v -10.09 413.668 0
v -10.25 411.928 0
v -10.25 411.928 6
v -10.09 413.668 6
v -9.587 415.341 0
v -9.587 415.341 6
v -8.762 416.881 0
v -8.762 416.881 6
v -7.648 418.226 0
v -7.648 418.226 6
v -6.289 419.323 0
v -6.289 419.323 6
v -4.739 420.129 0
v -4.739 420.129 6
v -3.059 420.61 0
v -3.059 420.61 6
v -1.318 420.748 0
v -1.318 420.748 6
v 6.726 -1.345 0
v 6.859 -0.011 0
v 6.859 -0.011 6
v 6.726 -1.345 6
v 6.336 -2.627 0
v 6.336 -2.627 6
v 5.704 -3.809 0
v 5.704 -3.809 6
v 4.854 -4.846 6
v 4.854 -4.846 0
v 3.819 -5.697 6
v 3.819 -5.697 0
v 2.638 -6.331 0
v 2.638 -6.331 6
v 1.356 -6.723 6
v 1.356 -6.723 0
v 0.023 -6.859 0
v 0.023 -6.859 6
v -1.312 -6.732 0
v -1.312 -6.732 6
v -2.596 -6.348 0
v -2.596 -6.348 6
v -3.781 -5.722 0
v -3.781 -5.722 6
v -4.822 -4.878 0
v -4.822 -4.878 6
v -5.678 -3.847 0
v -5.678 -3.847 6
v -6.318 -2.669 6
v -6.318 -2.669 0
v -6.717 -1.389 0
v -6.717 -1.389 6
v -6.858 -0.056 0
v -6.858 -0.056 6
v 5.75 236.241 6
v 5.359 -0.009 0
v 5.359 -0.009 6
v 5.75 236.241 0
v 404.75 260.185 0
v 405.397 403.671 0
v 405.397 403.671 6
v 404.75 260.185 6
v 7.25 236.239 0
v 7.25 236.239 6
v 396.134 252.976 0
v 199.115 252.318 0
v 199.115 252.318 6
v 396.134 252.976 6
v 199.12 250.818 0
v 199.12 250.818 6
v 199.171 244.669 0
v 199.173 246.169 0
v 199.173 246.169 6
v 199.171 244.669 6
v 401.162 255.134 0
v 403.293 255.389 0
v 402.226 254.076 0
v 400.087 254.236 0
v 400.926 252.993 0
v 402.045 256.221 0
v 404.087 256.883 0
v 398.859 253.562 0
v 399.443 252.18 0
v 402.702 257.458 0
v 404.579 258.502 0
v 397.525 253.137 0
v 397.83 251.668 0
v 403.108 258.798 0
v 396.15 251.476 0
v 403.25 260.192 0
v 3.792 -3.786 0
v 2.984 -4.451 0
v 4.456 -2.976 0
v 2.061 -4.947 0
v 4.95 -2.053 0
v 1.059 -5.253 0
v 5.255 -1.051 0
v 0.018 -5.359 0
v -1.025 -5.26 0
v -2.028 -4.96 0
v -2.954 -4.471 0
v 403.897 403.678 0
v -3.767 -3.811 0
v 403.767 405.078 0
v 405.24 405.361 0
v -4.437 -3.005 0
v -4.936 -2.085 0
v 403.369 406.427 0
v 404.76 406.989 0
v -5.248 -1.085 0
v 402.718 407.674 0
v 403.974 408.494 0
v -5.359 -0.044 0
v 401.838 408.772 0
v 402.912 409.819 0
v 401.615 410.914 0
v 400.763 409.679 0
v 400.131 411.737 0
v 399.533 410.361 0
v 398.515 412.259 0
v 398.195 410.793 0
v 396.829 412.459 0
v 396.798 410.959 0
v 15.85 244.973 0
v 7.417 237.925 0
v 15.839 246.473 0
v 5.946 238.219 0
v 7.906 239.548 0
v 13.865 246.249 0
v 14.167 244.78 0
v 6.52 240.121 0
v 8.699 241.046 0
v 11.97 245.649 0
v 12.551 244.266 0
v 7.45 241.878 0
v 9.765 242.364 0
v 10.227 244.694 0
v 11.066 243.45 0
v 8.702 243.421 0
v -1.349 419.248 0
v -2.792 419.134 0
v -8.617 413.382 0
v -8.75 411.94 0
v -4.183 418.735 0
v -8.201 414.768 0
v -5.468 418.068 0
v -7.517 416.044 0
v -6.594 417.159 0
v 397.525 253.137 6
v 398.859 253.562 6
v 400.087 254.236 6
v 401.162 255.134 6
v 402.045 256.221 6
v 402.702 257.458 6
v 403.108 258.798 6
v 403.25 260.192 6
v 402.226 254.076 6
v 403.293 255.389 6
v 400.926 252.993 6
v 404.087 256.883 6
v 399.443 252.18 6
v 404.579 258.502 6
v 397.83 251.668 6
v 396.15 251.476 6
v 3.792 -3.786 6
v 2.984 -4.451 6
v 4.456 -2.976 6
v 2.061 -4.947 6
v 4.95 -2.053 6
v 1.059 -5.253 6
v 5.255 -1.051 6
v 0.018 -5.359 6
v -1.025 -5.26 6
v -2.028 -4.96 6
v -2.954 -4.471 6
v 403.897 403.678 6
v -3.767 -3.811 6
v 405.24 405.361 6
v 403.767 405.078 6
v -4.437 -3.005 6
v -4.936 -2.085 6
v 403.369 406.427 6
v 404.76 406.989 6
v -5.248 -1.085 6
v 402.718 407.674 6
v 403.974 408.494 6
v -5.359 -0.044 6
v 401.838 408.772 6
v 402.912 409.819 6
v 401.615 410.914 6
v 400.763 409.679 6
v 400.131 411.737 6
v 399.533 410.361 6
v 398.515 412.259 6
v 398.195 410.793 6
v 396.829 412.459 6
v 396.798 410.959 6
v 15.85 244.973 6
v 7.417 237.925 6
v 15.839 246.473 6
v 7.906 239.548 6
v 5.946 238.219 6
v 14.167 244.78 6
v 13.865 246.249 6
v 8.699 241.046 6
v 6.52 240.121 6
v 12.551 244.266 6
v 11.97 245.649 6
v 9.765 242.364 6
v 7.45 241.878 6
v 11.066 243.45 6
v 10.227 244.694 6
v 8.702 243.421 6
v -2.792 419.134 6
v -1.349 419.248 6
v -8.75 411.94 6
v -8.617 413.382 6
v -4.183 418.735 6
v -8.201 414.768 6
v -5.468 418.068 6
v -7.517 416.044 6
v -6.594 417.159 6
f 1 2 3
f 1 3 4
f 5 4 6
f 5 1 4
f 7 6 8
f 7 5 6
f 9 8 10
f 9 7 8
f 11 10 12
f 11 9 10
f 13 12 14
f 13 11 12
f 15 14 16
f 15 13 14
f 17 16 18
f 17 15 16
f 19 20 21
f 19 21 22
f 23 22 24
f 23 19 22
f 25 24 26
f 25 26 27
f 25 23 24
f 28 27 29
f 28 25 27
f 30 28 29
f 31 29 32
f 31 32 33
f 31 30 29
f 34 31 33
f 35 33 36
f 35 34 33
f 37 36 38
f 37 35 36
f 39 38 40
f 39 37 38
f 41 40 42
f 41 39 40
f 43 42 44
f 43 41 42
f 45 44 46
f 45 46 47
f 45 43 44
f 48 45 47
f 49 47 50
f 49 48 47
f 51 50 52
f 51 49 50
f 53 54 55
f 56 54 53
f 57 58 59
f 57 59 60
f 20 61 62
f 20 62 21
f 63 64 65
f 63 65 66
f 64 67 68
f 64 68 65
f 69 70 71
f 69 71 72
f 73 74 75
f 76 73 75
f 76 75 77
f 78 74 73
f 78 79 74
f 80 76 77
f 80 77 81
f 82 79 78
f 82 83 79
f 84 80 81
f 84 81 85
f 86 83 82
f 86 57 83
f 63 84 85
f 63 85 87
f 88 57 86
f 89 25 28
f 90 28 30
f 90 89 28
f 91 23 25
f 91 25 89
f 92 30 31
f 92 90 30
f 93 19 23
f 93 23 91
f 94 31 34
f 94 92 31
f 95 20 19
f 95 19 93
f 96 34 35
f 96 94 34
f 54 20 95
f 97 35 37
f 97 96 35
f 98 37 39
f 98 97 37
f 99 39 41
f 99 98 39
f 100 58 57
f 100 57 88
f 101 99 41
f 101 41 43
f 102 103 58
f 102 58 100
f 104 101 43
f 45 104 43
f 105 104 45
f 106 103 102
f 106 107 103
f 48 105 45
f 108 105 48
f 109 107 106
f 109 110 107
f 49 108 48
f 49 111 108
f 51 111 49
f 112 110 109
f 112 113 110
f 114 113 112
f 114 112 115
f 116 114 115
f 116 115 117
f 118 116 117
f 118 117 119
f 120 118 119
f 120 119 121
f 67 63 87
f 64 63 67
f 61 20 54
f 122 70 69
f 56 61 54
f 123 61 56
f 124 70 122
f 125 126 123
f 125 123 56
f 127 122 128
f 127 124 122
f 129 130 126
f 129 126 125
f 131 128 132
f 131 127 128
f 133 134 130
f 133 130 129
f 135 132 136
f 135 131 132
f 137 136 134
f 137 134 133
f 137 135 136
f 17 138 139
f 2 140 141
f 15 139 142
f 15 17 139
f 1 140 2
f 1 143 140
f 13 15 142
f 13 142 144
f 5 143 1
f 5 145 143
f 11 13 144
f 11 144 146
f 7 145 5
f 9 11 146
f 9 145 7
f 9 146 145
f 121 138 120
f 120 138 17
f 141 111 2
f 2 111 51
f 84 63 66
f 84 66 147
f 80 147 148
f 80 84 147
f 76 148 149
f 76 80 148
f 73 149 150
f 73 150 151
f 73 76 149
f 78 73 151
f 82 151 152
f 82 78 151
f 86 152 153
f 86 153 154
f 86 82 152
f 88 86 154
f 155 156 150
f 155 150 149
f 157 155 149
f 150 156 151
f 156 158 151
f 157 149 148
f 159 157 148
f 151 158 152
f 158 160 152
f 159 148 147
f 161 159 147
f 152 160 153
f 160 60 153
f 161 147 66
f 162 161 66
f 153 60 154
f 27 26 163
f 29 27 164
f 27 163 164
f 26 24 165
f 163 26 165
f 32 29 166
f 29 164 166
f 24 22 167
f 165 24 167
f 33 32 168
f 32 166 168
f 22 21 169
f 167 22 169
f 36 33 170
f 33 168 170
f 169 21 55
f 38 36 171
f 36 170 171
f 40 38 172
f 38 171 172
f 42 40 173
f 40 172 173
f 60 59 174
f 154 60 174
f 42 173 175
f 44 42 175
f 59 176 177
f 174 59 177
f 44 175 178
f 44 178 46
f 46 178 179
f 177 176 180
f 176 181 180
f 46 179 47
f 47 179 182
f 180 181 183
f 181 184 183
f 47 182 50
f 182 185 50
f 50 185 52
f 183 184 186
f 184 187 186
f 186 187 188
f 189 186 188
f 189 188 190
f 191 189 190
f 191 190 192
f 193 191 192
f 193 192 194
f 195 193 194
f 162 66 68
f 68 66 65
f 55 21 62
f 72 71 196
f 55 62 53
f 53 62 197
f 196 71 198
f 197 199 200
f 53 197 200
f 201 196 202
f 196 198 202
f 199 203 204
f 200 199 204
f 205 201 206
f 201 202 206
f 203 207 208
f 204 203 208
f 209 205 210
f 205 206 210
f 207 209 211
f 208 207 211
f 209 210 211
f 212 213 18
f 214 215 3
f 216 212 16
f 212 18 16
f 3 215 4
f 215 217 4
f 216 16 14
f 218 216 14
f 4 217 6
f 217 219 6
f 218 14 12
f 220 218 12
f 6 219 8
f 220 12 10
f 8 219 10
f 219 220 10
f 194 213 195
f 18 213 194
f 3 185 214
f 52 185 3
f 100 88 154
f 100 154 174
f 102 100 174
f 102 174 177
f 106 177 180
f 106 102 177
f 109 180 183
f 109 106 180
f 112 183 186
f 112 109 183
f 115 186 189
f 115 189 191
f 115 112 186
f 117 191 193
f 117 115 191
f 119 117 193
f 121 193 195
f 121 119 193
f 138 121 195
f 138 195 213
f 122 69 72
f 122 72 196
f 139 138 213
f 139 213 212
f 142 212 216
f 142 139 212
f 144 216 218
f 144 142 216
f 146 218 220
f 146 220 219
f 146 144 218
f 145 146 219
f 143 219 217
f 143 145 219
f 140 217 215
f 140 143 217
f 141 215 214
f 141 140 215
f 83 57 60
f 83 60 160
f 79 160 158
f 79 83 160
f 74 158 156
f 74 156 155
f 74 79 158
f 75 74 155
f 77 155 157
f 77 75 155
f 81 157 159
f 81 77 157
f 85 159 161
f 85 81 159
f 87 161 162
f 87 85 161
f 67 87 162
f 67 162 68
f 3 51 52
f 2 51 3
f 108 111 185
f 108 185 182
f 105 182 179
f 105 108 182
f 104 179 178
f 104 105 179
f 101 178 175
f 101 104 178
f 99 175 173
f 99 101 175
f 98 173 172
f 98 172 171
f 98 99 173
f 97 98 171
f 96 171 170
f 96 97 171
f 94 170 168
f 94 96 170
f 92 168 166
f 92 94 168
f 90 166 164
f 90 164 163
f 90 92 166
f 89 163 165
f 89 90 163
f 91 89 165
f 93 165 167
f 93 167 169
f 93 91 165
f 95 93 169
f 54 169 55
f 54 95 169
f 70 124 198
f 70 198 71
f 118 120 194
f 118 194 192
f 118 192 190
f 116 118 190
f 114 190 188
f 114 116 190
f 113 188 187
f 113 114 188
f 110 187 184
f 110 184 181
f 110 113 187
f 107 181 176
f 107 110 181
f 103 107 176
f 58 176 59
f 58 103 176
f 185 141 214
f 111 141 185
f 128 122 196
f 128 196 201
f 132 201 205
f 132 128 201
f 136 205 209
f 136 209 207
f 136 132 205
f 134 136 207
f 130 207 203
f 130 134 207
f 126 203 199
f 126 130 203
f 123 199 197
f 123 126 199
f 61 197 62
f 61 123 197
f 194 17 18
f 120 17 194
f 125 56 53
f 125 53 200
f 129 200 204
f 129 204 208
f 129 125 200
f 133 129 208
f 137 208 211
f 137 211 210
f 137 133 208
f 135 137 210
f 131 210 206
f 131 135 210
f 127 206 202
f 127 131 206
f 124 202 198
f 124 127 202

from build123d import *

# Parameters (mm, degrees)
EXTRUDE_1_DEPTH = 6


with BuildPart() as part:
    # Эскиз1 → Вытянуть-Тонкостенный1 (new body)
    with BuildSketch(Plane.XY):
        with BuildLine():
            Line((199.171010966, 244.669379092), (15.850409713, 244.973028732))
            ThreePointArc((15.850409713, 244.973028732), (9.76523397, 242.3635414), (7.250012003, 236.238800882))
            Line((7.250012003, 236.238800882), (6.858690591, -0.011360638))
            ThreePointArc((6.858690591, -0.011360638), (0.022547579, -6.858662938), (-6.858467649, -0.056455245))
            Line((-6.858467649, -0.056455245), (-10.249703578, 411.927977114))
            ThreePointArc((-10.249703578, 411.927977114), (-7.648126176, 418.225997476), (-1.317862082, 420.748104128))
            Line((-1.317862082, 420.748104128), (396.829346884, 412.458570479))
            ThreePointArc((396.829346884, 412.458570479), (402.912249078, 409.818802658), (405.397119956, 403.670998988))
            Line((405.397119956, 403.670998988), (404.749910989, 260.184840159))
            ThreePointArc((404.749910989, 260.184840159), (402.225998422, 254.076182312), (396.149590287, 251.475586319))
            Line((396.149590287, 251.475586319), (199.120398676, 250.818015146))
            Line((199.120398676, 250.818015146), (199.115392559, 252.318006792))
            Line((199.115392559, 252.318006792), (396.13377965, 252.975541906))
            ThreePointArc((396.13377965, 252.975541906), (401.162138455, 255.133646805), (403.249926248, 260.191605993))
            Line((403.249926248, 260.191605993), (403.897135215, 403.677764822))
            ThreePointArc((403.897135215, 403.677764822), (401.838242202, 408.771659292), (396.798123241, 410.958895487))
            Line((396.798123241, 410.958895487), (-1.349085725, 419.248429135))
            ThreePointArc((-1.349085725, 419.248429135), (-6.594161688, 417.158683623), (-8.749754393, 411.940323895))
            Line((-8.749754393, 411.940323895), (-5.358518464, -0.044108464))
            ThreePointArc((-5.358518464, -0.044108464), (0.017616416, -5.358671043), (5.358692649, -0.008876062))
            Line((5.358692649, -0.008876062), (5.750014061, 236.241285457))
            ThreePointArc((5.750014061, 236.241285457), (8.70154817, 243.421188856), (15.839385081, 246.473049051))
            Line((15.839385081, 246.473049051), (199.173495541, 246.169377034))
            Line((199.173495541, 246.169377034), (199.171010966, 244.669379092))
        make_face()
    extrude(amount=EXTRUDE_1_DEPTH)


solid = part.part
